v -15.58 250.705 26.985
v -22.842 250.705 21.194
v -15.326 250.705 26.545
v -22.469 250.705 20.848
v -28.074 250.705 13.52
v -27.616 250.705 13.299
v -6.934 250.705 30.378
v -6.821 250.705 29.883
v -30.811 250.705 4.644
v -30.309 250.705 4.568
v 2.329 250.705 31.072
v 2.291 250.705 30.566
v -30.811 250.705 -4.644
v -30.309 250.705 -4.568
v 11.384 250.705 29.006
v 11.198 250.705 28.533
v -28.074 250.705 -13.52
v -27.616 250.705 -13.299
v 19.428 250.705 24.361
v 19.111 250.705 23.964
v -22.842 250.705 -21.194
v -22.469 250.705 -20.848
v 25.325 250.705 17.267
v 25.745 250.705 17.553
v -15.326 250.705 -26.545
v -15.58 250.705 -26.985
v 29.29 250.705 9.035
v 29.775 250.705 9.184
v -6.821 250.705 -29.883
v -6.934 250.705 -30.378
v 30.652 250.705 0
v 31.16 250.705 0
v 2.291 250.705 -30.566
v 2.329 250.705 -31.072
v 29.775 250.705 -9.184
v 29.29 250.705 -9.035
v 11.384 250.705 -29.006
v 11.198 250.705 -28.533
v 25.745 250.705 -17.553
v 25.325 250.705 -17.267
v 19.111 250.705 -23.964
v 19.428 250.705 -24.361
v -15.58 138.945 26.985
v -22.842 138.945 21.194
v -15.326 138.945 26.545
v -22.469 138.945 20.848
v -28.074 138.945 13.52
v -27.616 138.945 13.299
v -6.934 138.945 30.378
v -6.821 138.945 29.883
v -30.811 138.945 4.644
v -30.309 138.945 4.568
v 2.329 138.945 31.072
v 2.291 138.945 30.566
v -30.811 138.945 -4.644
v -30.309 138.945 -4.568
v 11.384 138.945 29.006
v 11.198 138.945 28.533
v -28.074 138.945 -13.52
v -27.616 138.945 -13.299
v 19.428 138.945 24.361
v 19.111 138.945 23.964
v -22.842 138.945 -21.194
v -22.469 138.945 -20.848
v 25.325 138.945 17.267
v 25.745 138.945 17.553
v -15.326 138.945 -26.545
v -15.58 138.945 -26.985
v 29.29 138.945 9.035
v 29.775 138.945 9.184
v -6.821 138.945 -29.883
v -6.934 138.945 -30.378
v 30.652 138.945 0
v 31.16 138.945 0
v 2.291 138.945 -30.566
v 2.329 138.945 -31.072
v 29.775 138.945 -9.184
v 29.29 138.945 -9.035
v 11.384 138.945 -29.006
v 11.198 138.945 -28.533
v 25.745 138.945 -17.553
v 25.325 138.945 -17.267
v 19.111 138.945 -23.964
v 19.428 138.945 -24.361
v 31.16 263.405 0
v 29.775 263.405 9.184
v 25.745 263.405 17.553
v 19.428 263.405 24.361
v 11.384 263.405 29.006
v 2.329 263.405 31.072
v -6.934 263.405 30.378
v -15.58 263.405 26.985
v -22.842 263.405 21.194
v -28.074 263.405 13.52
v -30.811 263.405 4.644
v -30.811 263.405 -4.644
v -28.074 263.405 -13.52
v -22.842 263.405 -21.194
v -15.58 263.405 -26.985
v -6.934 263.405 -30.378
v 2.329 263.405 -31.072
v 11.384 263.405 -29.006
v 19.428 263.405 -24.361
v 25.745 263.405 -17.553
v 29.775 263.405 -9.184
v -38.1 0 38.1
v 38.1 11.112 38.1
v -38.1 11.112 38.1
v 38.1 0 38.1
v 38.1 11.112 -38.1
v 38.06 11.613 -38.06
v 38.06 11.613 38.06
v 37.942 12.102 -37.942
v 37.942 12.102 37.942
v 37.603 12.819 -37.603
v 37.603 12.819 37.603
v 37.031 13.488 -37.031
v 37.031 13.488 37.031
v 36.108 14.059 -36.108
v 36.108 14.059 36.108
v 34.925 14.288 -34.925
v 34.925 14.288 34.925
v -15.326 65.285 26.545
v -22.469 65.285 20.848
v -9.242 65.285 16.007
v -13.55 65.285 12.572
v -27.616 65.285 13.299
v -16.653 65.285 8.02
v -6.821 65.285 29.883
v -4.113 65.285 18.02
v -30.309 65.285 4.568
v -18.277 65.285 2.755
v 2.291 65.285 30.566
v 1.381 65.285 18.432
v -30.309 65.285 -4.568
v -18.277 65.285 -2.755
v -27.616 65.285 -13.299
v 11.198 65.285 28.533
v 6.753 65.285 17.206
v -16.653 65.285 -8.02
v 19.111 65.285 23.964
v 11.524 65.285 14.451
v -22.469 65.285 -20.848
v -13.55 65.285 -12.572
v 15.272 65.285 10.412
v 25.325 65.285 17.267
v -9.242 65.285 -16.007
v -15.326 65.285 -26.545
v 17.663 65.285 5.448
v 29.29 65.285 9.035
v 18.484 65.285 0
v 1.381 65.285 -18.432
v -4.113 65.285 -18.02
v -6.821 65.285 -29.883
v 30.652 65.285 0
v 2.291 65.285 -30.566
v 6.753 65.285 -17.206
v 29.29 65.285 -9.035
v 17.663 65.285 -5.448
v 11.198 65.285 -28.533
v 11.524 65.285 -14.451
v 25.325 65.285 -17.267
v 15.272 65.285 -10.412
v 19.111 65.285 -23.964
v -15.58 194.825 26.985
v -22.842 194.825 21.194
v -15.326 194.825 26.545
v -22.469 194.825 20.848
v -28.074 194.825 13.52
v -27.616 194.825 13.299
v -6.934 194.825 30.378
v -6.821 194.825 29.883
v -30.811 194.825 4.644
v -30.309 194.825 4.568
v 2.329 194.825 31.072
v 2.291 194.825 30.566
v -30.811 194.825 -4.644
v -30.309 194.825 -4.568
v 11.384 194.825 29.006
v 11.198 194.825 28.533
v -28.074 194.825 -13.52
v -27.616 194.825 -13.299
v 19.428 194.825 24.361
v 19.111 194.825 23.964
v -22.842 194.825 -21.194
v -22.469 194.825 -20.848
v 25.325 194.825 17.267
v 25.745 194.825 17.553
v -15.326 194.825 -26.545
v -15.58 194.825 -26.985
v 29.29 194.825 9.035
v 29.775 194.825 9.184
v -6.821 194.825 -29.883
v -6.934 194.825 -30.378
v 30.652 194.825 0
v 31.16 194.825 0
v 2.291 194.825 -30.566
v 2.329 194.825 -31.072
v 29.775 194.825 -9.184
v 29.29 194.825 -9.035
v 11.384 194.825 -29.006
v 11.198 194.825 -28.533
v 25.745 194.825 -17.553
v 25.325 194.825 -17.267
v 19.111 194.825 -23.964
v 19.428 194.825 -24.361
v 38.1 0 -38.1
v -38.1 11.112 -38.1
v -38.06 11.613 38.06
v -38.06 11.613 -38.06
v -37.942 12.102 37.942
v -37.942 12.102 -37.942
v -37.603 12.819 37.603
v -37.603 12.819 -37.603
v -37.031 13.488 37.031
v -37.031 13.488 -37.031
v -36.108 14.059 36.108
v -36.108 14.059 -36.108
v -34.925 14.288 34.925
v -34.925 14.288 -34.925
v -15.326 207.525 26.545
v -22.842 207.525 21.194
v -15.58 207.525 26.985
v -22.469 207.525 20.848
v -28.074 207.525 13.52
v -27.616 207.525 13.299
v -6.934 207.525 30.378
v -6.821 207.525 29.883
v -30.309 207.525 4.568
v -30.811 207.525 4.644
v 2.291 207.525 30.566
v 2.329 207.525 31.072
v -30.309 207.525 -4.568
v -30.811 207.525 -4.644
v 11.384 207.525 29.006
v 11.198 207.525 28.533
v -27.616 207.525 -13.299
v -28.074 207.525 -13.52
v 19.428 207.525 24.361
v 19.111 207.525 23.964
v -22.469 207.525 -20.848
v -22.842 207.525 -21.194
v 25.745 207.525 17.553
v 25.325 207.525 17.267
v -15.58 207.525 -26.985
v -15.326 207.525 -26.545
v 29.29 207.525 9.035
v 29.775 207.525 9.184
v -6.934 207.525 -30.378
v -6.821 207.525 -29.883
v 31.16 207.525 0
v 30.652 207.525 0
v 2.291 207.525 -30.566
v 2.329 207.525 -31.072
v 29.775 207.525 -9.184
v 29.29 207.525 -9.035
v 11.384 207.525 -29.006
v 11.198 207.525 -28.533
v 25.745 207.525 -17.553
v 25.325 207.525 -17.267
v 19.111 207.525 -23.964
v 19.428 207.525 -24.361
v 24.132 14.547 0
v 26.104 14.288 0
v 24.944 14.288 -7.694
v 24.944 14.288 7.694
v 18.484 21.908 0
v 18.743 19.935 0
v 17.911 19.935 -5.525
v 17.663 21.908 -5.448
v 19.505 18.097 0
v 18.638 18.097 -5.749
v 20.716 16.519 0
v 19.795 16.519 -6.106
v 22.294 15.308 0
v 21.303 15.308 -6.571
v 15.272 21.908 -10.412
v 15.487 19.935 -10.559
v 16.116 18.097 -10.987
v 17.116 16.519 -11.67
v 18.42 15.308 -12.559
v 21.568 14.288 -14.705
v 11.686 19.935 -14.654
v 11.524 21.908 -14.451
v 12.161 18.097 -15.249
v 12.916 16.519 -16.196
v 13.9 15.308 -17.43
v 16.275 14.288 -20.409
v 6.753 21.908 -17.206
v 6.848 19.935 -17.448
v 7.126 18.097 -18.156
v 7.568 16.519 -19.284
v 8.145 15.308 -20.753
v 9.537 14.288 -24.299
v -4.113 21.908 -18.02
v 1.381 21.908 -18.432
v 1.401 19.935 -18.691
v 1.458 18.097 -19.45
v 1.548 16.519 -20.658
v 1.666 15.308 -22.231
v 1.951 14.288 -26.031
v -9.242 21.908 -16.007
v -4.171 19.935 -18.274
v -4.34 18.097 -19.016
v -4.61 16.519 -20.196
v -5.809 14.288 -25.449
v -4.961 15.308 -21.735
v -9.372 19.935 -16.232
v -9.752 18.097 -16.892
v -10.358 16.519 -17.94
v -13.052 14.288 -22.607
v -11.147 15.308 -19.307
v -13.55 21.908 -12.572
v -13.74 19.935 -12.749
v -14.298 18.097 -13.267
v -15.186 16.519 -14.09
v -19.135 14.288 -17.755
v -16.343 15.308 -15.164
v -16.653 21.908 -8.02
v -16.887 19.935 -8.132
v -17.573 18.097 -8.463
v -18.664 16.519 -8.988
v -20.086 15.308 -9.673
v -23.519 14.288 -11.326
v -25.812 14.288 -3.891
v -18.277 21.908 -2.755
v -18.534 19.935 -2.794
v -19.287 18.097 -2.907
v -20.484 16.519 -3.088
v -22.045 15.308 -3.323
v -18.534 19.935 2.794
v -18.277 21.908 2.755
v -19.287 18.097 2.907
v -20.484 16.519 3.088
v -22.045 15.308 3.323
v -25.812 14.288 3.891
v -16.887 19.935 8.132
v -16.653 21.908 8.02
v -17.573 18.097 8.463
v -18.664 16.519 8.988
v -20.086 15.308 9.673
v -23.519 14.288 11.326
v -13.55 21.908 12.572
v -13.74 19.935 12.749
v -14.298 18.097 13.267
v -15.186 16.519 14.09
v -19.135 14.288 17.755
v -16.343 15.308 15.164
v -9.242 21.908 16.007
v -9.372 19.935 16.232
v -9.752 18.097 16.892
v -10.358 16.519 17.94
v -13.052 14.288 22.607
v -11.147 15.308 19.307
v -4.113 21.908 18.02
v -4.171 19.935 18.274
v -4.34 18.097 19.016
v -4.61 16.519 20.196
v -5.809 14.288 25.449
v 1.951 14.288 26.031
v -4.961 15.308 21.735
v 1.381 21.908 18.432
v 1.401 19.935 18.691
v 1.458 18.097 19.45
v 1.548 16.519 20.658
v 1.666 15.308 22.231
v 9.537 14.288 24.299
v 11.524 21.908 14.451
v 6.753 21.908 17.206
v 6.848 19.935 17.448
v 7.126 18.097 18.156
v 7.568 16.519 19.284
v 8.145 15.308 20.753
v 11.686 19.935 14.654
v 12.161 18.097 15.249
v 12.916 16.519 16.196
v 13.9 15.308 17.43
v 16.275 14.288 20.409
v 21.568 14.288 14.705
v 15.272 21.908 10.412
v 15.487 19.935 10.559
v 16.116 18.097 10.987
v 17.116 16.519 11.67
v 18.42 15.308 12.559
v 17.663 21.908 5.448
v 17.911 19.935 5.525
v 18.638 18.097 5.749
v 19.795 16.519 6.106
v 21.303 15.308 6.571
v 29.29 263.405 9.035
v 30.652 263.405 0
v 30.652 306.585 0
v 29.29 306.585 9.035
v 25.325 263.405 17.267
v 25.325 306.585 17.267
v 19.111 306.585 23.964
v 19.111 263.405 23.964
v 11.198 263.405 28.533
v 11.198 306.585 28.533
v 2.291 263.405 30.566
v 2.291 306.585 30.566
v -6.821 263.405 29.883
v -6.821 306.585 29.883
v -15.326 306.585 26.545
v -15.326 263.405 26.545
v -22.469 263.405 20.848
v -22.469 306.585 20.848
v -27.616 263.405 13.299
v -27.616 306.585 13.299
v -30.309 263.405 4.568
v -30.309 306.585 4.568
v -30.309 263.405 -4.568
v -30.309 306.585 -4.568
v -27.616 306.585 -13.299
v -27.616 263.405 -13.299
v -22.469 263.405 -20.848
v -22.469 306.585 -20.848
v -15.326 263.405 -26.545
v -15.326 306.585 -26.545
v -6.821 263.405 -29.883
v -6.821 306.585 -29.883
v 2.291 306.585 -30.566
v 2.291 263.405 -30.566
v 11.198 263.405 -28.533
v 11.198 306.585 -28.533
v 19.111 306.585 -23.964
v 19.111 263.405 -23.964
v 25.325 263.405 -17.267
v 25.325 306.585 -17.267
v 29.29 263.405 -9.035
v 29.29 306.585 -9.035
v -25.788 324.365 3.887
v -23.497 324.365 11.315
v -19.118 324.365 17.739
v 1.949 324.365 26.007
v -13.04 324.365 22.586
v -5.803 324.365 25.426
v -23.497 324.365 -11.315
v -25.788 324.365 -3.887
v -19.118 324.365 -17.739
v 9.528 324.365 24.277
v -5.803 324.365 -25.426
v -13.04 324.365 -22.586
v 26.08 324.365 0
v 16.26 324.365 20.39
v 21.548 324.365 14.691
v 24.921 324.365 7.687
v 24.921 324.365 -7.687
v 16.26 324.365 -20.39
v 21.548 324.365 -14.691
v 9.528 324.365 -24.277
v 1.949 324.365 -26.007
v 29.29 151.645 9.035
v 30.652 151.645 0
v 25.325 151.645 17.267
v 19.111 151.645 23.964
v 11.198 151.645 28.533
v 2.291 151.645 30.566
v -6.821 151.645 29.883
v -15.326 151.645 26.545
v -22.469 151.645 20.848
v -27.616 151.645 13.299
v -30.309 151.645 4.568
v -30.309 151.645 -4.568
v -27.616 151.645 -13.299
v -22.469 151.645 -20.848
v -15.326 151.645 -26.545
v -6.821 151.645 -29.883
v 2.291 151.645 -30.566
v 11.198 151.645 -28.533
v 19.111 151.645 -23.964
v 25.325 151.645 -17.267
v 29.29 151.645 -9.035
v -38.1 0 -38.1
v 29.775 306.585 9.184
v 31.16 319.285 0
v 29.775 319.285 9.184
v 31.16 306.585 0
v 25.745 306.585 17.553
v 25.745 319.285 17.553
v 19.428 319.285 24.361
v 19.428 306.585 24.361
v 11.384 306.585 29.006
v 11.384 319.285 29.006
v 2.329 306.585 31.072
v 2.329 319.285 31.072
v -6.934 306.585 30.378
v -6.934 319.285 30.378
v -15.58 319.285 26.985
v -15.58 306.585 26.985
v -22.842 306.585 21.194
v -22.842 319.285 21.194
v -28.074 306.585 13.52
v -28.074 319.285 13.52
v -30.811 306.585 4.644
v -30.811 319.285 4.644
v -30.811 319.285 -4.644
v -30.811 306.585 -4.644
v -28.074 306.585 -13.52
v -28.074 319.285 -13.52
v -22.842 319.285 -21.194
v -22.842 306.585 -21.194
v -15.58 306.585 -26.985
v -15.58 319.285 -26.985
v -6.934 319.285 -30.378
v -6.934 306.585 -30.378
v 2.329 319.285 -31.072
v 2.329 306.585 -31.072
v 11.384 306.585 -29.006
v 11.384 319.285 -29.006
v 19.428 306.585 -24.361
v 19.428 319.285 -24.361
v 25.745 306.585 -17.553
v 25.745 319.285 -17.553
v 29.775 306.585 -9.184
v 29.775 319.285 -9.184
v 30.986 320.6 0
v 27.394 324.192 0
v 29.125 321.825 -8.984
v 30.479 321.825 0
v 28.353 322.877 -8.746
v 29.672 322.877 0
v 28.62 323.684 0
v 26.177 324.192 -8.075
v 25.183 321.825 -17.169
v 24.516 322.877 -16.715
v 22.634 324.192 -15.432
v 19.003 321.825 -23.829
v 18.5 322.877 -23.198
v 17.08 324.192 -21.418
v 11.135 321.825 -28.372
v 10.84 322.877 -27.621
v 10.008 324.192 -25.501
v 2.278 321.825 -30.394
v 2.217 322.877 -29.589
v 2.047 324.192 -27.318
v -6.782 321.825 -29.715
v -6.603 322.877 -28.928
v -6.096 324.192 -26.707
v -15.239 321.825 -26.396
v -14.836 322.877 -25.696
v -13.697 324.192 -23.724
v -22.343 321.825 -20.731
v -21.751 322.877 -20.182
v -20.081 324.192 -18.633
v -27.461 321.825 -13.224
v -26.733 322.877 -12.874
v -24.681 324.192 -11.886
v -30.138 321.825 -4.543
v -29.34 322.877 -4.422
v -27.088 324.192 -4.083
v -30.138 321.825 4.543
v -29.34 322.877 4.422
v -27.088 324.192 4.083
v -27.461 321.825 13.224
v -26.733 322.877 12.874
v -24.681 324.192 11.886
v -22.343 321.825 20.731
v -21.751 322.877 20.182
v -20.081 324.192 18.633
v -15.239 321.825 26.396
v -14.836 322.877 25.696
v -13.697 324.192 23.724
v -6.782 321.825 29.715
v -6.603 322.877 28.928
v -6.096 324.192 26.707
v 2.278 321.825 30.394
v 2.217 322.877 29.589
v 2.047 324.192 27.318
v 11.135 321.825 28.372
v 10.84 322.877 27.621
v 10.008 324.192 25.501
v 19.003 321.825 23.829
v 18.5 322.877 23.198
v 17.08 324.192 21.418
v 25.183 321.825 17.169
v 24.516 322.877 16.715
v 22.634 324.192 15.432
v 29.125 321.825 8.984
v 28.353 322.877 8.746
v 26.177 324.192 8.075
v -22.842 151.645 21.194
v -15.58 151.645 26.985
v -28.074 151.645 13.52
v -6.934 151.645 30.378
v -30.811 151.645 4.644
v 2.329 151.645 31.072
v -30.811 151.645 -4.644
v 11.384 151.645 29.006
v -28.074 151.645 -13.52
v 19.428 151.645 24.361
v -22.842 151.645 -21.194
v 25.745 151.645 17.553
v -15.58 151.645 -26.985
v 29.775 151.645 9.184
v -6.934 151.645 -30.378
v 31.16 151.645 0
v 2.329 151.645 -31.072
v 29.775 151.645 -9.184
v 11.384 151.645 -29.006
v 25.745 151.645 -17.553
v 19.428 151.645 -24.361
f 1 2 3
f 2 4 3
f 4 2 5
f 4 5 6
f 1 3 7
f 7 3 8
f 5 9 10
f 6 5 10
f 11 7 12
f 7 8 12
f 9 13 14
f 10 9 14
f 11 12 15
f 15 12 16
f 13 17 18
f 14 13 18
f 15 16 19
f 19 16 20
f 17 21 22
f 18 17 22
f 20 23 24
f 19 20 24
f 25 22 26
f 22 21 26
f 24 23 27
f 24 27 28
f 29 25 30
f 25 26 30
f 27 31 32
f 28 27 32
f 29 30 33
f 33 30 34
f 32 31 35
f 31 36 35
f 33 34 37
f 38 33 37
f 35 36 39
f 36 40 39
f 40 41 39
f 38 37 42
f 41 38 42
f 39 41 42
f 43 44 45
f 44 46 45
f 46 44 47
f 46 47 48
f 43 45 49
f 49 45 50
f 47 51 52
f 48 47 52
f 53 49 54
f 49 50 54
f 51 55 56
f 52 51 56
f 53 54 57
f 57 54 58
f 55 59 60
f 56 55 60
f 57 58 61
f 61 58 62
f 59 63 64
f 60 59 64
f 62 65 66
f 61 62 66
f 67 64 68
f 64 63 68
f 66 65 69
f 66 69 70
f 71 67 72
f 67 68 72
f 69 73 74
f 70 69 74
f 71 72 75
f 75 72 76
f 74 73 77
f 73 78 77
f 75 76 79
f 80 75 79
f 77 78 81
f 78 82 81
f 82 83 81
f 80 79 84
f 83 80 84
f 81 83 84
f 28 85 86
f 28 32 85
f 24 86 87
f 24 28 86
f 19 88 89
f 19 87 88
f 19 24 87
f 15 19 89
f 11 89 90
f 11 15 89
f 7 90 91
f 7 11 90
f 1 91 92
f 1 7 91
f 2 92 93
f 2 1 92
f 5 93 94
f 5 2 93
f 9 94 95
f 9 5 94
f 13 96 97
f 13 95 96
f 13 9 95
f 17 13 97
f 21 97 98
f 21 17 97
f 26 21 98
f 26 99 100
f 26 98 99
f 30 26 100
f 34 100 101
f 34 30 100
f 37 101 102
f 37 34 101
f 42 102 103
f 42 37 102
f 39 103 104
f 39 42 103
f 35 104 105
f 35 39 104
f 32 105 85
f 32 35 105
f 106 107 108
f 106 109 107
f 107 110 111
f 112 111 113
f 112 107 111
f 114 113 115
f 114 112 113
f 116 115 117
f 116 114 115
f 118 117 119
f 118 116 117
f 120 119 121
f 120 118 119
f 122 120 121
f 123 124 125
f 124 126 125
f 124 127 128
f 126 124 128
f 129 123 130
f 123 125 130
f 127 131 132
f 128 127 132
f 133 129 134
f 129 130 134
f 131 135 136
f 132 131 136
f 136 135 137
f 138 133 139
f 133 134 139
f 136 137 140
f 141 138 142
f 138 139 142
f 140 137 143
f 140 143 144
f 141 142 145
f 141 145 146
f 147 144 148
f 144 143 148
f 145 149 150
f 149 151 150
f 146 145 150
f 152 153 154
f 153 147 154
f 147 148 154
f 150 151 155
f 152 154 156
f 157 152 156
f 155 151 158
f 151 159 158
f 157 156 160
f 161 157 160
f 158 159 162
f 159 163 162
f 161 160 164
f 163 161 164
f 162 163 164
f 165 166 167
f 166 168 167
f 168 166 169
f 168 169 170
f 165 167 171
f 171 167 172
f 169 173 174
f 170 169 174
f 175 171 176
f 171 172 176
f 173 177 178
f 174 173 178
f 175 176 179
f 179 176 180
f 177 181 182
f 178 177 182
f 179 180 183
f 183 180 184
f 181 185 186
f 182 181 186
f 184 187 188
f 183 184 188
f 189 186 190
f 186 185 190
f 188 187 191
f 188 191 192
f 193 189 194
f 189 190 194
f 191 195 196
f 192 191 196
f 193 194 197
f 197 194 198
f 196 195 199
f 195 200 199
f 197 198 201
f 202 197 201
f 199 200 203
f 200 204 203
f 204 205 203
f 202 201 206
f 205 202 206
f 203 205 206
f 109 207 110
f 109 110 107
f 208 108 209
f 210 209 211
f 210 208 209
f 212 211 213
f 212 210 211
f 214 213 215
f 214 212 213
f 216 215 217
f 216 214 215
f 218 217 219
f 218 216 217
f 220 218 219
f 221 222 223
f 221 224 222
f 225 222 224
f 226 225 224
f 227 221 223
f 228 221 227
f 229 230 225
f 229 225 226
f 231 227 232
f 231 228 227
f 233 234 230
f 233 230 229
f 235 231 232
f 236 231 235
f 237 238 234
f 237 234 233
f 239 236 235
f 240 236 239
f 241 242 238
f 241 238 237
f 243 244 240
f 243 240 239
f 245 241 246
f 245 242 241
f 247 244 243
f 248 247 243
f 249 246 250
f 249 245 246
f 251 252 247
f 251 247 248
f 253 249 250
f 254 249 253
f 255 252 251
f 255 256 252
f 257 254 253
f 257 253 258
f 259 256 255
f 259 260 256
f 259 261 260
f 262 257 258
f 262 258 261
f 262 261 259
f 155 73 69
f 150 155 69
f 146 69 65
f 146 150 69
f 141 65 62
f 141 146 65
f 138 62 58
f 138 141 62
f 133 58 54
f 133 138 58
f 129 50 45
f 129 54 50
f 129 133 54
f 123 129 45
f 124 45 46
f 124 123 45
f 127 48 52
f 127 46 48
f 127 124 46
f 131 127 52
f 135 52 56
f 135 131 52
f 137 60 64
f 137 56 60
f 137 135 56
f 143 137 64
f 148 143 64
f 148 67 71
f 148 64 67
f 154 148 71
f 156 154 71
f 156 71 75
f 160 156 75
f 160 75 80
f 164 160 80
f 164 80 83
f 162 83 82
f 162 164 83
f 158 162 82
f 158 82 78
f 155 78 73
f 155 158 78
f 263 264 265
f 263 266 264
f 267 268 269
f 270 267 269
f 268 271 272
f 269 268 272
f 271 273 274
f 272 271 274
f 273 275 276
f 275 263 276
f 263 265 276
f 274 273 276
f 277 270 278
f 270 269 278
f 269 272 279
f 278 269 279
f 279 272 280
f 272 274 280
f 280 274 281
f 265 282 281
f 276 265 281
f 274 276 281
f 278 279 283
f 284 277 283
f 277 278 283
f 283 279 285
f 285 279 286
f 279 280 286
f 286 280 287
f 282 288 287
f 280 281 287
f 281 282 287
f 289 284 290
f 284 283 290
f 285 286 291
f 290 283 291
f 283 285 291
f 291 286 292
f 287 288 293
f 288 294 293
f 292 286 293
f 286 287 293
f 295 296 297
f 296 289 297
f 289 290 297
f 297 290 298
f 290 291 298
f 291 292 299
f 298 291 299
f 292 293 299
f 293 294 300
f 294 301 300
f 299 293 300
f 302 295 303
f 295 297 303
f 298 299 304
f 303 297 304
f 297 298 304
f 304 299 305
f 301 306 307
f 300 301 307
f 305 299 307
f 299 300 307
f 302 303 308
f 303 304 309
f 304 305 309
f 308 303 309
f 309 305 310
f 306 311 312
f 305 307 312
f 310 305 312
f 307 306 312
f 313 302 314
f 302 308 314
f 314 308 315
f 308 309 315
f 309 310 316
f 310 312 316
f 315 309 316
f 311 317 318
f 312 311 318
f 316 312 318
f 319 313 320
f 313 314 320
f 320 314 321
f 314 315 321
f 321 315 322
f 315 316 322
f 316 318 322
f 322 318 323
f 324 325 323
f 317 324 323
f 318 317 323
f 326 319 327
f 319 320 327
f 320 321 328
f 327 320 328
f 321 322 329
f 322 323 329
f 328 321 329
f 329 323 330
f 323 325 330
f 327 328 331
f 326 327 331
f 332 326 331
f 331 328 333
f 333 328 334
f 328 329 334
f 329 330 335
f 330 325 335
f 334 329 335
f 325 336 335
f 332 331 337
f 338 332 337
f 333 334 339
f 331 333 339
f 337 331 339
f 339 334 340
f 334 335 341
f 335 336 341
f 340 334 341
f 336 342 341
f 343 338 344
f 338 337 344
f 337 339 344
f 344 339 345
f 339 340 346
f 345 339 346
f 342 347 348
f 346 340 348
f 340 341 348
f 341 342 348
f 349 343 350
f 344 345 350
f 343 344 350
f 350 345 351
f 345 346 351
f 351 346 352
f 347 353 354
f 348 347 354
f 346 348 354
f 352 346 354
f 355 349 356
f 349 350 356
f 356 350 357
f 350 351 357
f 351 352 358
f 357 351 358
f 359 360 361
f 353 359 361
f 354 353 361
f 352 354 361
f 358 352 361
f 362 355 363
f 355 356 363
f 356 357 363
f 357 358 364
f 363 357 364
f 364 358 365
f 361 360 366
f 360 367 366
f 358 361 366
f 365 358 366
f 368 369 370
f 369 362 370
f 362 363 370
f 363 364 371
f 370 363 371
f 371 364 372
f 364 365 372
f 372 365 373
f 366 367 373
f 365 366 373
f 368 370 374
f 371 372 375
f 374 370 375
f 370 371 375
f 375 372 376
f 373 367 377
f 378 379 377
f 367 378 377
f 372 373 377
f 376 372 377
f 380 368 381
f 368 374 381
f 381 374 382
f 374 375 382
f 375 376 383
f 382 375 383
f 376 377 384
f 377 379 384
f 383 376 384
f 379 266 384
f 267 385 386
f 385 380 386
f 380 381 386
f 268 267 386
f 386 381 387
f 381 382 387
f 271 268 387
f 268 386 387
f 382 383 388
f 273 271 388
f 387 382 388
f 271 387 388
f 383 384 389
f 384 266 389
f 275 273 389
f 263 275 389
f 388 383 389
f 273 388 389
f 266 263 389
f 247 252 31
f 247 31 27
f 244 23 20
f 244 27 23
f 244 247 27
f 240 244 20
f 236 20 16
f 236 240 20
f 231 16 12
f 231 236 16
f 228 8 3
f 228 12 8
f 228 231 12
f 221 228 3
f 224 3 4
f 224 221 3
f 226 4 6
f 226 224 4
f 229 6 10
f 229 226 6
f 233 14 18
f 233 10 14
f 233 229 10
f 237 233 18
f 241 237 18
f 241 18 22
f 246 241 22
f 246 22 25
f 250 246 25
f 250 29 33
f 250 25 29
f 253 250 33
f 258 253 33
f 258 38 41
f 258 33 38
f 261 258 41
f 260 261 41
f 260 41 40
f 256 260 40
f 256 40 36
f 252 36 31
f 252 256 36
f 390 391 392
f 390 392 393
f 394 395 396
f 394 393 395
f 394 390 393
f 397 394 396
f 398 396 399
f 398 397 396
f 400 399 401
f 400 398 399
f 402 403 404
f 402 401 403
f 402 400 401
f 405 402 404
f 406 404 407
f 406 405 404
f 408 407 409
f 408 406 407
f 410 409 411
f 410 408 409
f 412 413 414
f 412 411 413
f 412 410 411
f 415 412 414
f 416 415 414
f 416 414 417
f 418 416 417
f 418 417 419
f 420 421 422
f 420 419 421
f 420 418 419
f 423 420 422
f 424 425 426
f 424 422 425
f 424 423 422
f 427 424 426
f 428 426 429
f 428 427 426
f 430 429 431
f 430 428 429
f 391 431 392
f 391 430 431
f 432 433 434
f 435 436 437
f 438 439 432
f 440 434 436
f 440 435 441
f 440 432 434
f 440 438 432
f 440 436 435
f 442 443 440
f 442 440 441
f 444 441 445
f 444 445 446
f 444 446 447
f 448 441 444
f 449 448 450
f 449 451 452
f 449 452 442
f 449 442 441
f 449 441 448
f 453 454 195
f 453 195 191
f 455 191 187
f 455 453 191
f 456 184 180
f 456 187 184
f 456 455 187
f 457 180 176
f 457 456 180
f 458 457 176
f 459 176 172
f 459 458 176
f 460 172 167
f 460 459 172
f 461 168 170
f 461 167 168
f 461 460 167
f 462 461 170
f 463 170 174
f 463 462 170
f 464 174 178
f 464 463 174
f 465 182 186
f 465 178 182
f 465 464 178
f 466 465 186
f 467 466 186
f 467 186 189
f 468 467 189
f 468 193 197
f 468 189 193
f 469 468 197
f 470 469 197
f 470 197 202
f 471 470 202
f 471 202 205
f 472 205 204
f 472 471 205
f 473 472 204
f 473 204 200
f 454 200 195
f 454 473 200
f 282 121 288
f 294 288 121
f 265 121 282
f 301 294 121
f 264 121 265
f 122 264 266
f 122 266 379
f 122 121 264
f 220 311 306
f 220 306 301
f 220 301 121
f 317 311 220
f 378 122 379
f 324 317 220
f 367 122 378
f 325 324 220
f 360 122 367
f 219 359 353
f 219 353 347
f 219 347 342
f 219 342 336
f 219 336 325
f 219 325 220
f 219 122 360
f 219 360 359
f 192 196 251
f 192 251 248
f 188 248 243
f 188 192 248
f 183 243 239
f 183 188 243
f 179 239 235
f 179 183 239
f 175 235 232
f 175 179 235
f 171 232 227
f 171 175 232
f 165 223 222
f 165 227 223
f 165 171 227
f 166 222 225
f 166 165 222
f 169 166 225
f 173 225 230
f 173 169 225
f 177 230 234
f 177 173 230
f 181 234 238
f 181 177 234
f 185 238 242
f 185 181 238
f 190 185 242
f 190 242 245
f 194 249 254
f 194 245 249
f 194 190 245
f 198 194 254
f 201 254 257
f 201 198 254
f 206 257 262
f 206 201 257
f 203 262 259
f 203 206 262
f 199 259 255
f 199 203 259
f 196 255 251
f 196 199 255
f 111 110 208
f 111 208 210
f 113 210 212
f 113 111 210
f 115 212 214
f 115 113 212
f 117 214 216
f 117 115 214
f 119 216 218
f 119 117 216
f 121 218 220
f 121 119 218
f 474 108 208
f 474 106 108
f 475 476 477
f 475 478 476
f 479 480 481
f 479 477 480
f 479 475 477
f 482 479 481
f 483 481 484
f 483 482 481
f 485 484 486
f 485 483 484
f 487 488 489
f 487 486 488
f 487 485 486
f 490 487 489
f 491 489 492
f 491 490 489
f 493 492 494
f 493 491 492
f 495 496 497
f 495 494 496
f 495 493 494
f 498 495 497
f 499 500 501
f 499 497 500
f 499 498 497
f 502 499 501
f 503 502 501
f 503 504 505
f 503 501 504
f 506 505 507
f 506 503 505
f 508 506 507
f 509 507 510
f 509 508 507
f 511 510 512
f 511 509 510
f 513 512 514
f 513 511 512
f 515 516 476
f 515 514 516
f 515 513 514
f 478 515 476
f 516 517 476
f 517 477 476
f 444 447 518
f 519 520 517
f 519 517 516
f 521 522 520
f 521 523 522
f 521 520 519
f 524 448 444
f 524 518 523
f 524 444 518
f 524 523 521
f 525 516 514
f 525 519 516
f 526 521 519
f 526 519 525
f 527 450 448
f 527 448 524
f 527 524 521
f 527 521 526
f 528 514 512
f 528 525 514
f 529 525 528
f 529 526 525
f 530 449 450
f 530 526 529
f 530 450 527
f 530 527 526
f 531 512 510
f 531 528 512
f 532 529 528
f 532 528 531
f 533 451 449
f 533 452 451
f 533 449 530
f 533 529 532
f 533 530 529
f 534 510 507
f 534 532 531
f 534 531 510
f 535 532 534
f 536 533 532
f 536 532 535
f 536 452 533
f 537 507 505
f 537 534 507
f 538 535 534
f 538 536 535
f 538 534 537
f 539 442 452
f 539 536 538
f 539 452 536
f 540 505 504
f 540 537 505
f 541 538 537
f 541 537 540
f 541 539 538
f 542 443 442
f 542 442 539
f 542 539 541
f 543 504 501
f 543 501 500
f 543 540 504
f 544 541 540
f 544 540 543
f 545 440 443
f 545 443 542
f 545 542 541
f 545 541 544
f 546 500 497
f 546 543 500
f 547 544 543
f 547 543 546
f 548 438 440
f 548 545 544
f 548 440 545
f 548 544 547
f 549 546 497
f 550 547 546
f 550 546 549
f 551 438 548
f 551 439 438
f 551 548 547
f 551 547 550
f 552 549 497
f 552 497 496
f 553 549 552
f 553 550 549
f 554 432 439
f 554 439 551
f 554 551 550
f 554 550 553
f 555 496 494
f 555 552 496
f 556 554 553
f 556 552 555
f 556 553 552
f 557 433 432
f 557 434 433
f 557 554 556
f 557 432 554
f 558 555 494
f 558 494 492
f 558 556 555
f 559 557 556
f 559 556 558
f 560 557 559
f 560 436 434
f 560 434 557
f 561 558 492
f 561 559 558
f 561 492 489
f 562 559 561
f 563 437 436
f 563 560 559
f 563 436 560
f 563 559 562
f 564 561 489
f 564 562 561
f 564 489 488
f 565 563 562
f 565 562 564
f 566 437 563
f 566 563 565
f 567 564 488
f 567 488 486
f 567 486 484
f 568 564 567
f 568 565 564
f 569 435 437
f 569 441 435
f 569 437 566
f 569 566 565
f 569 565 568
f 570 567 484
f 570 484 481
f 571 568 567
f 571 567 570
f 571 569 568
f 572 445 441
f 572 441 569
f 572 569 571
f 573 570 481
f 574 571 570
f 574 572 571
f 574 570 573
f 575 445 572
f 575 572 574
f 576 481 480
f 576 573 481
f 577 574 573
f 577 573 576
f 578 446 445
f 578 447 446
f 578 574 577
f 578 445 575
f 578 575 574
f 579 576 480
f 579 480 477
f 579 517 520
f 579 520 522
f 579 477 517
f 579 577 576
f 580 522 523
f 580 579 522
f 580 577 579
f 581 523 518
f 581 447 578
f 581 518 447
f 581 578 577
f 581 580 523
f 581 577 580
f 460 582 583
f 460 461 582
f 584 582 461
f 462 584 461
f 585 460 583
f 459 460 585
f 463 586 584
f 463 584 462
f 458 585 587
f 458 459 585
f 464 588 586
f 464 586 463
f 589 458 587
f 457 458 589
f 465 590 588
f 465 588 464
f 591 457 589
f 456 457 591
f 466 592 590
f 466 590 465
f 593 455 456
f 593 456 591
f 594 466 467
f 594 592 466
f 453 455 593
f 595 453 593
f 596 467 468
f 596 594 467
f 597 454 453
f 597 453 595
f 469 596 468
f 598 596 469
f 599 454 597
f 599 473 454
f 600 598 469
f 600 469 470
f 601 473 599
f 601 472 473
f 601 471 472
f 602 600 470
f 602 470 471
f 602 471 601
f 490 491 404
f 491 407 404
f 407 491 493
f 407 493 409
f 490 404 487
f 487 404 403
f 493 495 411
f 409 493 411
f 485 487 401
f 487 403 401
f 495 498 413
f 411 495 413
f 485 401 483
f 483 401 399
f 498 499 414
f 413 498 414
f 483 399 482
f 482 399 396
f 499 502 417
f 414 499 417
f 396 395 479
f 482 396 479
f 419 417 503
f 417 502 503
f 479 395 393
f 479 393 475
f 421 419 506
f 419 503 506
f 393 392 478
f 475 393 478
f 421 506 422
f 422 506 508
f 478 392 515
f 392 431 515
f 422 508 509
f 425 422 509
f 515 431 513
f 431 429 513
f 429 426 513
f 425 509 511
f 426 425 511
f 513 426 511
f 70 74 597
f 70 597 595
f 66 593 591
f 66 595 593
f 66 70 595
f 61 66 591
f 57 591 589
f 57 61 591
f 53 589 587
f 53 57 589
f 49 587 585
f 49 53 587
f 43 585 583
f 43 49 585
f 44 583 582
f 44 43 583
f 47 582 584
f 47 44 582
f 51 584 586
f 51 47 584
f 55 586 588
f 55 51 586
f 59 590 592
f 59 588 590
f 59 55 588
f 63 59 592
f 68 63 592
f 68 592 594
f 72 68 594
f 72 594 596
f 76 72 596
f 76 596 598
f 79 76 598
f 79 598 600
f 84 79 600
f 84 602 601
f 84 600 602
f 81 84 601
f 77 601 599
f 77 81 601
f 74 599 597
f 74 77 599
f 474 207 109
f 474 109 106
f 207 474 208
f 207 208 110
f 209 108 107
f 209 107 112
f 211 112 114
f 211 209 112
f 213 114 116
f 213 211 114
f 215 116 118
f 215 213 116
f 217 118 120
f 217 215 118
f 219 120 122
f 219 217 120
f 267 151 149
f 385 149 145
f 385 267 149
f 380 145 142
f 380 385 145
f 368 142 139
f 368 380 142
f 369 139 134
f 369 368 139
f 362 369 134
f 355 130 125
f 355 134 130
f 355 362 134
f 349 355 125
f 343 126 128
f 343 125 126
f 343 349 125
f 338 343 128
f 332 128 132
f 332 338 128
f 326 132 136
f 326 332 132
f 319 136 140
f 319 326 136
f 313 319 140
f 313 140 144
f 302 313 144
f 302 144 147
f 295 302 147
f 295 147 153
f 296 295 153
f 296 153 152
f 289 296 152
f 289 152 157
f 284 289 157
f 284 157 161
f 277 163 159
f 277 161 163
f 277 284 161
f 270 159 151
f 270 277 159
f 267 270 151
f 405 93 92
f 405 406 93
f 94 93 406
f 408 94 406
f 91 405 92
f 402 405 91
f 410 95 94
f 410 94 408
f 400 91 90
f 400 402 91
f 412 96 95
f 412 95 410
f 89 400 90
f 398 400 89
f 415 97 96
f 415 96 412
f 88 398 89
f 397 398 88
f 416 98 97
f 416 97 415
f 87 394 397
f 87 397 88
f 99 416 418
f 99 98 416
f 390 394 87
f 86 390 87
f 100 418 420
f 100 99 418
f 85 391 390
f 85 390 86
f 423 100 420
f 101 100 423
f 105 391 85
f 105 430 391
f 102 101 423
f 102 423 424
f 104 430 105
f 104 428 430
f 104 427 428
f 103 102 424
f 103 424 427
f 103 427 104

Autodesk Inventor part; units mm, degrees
ref_plane "YZ Plane" through (0, 0, 0) normal (1, 0, 0) x (0, 1, 0)
ref_plane "XZ Plane" through (0, 0, 0) normal (0, 1, 0) x (-1, 0, 0)
ref_plane "XY Plane" through (0, 0, 0) normal (0, 0, 1) x (1, 0, 0)
sketch "草圖1" plane through (0, 0, 0) normal (0, 0, 1) x (1, 0, 0)
  line L0 (-6.2319, 0) -> (37.3914, 0) construction
  line L1 (0, -62.7215) -> (0, 388.8794) construction
  line L2 (0, 324.365) -> (31.1595, 324.365)
  line L3 (31.1595, 324.365) -> (31.1595, 65.285)
  line L4 (31.1595, 65.285) -> (0, 65.285)
  line L5 (0, 65.285) -> (0, 324.365)
  line L6 (0, 65.285) -> (18.4838, 65.285)
  line L7 (18.4838, 65.285) -> (18.4838, 1.7929)
  line L8 (18.4838, 1.7929) -> (0, 1.7929)
  line L9 (0, 1.7929) -> (0, 65.285)
  line L10 (31.1595, 306.585) -> (30.6515, 306.585)
  line L11 (30.6515, 306.585) -> (30.6515, 263.405)
  line L12 (30.6515, 263.405) -> (31.1595, 263.405)
  line L13 (31.1595, 263.405) -> (31.1595, 306.585)
  line L14 (31.1595, 250.705) -> (30.6515, 250.705)
  line L15 (30.6515, 250.705) -> (30.6515, 207.525)
  line L16 (30.6515, 207.525) -> (31.1595, 207.525)
  line L17 (31.1595, 207.525) -> (31.1595, 250.705)
  line L18 (31.1595, 194.825) -> (30.6515, 194.825)
  line L19 (30.6515, 194.825) -> (30.6515, 151.645)
  line L20 (30.6515, 151.645) -> (31.1595, 151.645)
  line L21 (31.1595, 151.645) -> (31.1595, 194.825)
  line L22 (31.1595, 138.945) -> (30.6515, 138.945)
  line L23 (30.6515, 138.945) -> (30.6515, 65.285)
  line L24 (30.6515, 65.285) -> (31.1595, 65.285)
  line L25 (31.1595, 65.285) -> (31.1595, 138.945)
  point P0 (31.1595, 151.645)
  point P1 (31.1595, 207.525)
  point P2 (31.1595, 263.405)
  dimension "d7" = 0.508
  dimension "d8" = 43.18
  dimension "d9" = 43.18
  dimension "d10" = 17.78
  dimension "d11" = 12.7
  dimension "d12" = 12.7
  dimension "d13" = 43.18
  dimension "d18" = 12.7
revolve "迴轉1" add sketch "草圖1" angle 360 about axis through (0, 65.285, 0) along (0, 1, 0)
sketch "草圖2" plane through (0, 0, 0) normal (0, 1, 0) x (-1, 0, 0)
  line L0 (38.1, -38.1) -> (-38.1, -38.1)
  line L1 (-38.1, -38.1) -> (-38.1, 38.1)
  line L2 (-38.1, 38.1) -> (38.1, 38.1)
  line L3 (38.1, 38.1) -> (38.1, -38.1)
  line L4 (53.34, 0) -> (-53.34, 0) construction
  line L5 (0, -53.34) -> (0, 53.34) construction
  point P0 (0, 0)
  dimension "d5" = 76.2
  dimension "d6" = 76.2
extrude "擠出1" add sketch "草圖2" along normal blind 14.2875
revolve "迴轉2" cut sketch "草圖1" angle 360 about axis through (0, -10, 0) along (0, 1, 0) contours L3 L12 L11 L10 | L23 L22 L3 L4 | L3 L16 L15 L14 | L3 L20 L19 L18
fillet "圓角1" radius 5.08 1 edges at (-31.1595, 324.365, 0)
fillet "圓角2" radius 7.62 1 edges at (-18.4838, 14.2875, 0)
fillet "圓角3" radius 3.175 4 edges at (38.1, 14.2875, 0) (-38.1, 14.2875, 0) (0, 14.2875, 38.1) (0, 14.2875, -38.1)
properties part number "警示燈"
